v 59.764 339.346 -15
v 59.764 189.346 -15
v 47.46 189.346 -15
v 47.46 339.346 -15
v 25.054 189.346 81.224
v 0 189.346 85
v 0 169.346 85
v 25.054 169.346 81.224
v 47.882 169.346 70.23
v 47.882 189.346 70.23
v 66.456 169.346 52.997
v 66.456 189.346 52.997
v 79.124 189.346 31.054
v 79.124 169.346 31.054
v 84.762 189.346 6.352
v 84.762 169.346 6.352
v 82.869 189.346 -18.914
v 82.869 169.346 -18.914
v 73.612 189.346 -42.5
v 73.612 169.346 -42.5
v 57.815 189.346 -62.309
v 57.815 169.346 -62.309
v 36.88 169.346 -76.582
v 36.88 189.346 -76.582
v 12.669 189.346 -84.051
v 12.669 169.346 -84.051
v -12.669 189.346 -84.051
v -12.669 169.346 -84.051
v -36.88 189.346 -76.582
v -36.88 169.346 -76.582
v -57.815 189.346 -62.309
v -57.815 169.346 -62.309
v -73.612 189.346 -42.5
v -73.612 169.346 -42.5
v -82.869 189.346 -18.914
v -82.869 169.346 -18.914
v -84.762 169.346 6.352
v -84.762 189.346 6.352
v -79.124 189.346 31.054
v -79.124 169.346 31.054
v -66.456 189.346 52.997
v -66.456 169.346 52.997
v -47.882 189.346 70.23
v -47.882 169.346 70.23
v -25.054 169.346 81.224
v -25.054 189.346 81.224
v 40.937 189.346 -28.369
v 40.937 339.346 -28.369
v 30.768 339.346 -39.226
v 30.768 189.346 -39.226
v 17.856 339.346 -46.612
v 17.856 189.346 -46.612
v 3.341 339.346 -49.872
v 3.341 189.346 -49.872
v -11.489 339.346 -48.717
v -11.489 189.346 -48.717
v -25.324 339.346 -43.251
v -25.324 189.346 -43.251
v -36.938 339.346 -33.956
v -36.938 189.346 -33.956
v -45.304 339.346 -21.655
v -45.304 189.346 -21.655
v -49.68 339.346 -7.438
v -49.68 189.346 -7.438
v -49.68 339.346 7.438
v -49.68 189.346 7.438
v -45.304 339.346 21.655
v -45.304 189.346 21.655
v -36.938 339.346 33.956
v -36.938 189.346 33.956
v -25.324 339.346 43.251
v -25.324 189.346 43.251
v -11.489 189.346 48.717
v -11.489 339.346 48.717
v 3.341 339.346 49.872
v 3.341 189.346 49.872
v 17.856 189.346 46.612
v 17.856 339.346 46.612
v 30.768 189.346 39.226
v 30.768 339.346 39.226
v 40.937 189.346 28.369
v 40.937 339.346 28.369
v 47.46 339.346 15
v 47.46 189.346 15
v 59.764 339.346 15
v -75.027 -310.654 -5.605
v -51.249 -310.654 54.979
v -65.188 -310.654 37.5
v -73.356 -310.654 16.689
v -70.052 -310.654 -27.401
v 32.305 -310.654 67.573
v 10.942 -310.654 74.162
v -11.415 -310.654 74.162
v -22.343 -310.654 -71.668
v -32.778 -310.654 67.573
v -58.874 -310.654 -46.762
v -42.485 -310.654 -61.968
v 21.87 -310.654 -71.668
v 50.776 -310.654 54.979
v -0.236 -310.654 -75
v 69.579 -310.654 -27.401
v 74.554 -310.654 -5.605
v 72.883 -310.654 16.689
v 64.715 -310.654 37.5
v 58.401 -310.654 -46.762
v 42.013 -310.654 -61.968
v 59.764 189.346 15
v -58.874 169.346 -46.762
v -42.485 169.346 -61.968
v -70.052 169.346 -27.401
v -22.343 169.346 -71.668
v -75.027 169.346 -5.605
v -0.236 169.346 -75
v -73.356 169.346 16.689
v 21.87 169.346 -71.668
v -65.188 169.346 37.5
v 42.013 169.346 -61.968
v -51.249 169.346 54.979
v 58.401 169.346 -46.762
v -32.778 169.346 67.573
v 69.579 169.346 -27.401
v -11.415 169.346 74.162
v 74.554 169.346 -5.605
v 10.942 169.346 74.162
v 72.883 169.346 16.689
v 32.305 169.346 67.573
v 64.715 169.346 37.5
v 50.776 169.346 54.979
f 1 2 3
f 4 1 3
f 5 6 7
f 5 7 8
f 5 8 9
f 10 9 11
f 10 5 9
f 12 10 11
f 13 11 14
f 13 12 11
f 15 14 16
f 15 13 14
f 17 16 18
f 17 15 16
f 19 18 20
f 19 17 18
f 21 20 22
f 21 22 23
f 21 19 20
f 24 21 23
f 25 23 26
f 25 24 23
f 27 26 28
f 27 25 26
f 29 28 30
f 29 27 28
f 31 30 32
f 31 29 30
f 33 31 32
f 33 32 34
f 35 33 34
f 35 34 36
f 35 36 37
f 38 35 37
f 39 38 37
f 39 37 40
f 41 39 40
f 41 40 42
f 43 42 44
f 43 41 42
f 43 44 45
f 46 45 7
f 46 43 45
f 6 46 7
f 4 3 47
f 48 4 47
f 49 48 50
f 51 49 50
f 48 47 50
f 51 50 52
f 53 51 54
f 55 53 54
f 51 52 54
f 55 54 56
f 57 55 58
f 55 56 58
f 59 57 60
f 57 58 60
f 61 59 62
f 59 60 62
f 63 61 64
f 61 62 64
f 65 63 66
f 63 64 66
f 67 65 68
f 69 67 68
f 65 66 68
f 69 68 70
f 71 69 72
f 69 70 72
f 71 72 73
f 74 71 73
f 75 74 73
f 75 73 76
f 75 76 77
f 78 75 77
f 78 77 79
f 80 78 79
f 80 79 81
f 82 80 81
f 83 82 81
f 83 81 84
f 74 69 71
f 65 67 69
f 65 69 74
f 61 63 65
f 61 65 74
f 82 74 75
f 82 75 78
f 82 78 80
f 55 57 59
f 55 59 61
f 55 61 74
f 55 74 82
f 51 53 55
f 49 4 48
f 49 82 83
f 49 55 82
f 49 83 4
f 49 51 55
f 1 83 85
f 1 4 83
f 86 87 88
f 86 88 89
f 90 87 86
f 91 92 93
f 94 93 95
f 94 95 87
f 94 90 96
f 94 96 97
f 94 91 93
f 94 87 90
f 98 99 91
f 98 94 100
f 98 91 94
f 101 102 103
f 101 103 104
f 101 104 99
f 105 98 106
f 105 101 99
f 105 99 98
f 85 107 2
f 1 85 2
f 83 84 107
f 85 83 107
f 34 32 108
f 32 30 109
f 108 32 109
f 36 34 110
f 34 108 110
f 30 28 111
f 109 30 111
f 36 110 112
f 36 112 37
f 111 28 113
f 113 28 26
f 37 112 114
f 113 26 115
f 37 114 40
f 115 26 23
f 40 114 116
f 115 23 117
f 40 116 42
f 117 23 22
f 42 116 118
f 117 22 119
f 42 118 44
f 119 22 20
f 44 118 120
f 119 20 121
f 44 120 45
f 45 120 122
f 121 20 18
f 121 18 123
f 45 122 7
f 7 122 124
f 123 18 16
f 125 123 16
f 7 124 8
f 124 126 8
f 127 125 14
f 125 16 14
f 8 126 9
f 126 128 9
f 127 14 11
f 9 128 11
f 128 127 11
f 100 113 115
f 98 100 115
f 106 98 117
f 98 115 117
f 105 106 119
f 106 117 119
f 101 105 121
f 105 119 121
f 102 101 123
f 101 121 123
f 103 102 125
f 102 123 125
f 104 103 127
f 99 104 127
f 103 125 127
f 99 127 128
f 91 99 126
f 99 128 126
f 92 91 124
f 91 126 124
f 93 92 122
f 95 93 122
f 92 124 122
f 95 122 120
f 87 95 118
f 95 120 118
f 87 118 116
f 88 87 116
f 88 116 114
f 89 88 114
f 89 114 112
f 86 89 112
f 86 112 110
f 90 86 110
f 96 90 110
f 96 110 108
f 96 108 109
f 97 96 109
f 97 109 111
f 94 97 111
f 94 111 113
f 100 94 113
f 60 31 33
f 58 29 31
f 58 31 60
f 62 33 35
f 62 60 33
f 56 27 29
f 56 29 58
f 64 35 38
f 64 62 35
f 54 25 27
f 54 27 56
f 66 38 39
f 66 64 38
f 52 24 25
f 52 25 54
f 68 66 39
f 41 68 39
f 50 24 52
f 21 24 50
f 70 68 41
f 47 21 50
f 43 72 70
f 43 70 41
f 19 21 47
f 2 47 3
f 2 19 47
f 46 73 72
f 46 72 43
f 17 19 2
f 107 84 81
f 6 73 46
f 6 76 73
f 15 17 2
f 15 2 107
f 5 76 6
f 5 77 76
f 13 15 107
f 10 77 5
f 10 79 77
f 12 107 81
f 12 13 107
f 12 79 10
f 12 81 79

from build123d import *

# Parameters (mm, degrees)
BOSS_EXTRUDE1_DEPTH = 15
SKETCH2_R           = 7.5
BOSS_EXTRUDE2_DEPTH = 50
SCALE1_SCALE        = 10
SKETCH3_R           = 85
BOSS_EXTRUDE3_DEPTH = 20


with BuildPart() as part:
    # Sketch1 → Boss-Extrude1 (new body)
    with BuildSketch(Plane(origin=(0, 0, 0), x_dir=(1, 0, 0), z_dir=(0, 1, 0))):
        with BuildLine():
            Line((4.769696007, -1.5), (6, -1.5))
            Line((6, -1.5), (6, 1.5))
            Line((6, 1.5), (4.769696007, 1.5))
            ThreePointArc((4.769696007, 1.5), (-5, 0), (4.769696007, -1.5))
        make_face()
    extrude(amount=BOSS_EXTRUDE1_DEPTH)

    # Sketch2 → Boss-Extrude2 (add)
    with BuildSketch(Plane.XZ):
        with Locations(Location((0, 0, 0), (0, 0, 270))):
            Circle(SKETCH2_R)
    extrude(amount=BOSS_EXTRUDE2_DEPTH)


with BuildPart() as part_1:
    # Scale1: scaled about (0.026273948, -21.038472133, 0)
    add(part.part.scale(SCALE1_SCALE).moved(Location((-0.236465532, 189.346249197, 0))))

    # Sketch3 → Boss-Extrude3 (add)
    with BuildSketch(Plane(origin=(0, 189.346249199, 0), x_dir=(1, 0, 0), z_dir=(0, 1, 0))):
        with Locations(Location((0, 0, 0), (0, 0, 270))):
            Circle(SKETCH3_R)
    extrude(amount=-BOSS_EXTRUDE3_DEPTH)


solid = part_1.part
